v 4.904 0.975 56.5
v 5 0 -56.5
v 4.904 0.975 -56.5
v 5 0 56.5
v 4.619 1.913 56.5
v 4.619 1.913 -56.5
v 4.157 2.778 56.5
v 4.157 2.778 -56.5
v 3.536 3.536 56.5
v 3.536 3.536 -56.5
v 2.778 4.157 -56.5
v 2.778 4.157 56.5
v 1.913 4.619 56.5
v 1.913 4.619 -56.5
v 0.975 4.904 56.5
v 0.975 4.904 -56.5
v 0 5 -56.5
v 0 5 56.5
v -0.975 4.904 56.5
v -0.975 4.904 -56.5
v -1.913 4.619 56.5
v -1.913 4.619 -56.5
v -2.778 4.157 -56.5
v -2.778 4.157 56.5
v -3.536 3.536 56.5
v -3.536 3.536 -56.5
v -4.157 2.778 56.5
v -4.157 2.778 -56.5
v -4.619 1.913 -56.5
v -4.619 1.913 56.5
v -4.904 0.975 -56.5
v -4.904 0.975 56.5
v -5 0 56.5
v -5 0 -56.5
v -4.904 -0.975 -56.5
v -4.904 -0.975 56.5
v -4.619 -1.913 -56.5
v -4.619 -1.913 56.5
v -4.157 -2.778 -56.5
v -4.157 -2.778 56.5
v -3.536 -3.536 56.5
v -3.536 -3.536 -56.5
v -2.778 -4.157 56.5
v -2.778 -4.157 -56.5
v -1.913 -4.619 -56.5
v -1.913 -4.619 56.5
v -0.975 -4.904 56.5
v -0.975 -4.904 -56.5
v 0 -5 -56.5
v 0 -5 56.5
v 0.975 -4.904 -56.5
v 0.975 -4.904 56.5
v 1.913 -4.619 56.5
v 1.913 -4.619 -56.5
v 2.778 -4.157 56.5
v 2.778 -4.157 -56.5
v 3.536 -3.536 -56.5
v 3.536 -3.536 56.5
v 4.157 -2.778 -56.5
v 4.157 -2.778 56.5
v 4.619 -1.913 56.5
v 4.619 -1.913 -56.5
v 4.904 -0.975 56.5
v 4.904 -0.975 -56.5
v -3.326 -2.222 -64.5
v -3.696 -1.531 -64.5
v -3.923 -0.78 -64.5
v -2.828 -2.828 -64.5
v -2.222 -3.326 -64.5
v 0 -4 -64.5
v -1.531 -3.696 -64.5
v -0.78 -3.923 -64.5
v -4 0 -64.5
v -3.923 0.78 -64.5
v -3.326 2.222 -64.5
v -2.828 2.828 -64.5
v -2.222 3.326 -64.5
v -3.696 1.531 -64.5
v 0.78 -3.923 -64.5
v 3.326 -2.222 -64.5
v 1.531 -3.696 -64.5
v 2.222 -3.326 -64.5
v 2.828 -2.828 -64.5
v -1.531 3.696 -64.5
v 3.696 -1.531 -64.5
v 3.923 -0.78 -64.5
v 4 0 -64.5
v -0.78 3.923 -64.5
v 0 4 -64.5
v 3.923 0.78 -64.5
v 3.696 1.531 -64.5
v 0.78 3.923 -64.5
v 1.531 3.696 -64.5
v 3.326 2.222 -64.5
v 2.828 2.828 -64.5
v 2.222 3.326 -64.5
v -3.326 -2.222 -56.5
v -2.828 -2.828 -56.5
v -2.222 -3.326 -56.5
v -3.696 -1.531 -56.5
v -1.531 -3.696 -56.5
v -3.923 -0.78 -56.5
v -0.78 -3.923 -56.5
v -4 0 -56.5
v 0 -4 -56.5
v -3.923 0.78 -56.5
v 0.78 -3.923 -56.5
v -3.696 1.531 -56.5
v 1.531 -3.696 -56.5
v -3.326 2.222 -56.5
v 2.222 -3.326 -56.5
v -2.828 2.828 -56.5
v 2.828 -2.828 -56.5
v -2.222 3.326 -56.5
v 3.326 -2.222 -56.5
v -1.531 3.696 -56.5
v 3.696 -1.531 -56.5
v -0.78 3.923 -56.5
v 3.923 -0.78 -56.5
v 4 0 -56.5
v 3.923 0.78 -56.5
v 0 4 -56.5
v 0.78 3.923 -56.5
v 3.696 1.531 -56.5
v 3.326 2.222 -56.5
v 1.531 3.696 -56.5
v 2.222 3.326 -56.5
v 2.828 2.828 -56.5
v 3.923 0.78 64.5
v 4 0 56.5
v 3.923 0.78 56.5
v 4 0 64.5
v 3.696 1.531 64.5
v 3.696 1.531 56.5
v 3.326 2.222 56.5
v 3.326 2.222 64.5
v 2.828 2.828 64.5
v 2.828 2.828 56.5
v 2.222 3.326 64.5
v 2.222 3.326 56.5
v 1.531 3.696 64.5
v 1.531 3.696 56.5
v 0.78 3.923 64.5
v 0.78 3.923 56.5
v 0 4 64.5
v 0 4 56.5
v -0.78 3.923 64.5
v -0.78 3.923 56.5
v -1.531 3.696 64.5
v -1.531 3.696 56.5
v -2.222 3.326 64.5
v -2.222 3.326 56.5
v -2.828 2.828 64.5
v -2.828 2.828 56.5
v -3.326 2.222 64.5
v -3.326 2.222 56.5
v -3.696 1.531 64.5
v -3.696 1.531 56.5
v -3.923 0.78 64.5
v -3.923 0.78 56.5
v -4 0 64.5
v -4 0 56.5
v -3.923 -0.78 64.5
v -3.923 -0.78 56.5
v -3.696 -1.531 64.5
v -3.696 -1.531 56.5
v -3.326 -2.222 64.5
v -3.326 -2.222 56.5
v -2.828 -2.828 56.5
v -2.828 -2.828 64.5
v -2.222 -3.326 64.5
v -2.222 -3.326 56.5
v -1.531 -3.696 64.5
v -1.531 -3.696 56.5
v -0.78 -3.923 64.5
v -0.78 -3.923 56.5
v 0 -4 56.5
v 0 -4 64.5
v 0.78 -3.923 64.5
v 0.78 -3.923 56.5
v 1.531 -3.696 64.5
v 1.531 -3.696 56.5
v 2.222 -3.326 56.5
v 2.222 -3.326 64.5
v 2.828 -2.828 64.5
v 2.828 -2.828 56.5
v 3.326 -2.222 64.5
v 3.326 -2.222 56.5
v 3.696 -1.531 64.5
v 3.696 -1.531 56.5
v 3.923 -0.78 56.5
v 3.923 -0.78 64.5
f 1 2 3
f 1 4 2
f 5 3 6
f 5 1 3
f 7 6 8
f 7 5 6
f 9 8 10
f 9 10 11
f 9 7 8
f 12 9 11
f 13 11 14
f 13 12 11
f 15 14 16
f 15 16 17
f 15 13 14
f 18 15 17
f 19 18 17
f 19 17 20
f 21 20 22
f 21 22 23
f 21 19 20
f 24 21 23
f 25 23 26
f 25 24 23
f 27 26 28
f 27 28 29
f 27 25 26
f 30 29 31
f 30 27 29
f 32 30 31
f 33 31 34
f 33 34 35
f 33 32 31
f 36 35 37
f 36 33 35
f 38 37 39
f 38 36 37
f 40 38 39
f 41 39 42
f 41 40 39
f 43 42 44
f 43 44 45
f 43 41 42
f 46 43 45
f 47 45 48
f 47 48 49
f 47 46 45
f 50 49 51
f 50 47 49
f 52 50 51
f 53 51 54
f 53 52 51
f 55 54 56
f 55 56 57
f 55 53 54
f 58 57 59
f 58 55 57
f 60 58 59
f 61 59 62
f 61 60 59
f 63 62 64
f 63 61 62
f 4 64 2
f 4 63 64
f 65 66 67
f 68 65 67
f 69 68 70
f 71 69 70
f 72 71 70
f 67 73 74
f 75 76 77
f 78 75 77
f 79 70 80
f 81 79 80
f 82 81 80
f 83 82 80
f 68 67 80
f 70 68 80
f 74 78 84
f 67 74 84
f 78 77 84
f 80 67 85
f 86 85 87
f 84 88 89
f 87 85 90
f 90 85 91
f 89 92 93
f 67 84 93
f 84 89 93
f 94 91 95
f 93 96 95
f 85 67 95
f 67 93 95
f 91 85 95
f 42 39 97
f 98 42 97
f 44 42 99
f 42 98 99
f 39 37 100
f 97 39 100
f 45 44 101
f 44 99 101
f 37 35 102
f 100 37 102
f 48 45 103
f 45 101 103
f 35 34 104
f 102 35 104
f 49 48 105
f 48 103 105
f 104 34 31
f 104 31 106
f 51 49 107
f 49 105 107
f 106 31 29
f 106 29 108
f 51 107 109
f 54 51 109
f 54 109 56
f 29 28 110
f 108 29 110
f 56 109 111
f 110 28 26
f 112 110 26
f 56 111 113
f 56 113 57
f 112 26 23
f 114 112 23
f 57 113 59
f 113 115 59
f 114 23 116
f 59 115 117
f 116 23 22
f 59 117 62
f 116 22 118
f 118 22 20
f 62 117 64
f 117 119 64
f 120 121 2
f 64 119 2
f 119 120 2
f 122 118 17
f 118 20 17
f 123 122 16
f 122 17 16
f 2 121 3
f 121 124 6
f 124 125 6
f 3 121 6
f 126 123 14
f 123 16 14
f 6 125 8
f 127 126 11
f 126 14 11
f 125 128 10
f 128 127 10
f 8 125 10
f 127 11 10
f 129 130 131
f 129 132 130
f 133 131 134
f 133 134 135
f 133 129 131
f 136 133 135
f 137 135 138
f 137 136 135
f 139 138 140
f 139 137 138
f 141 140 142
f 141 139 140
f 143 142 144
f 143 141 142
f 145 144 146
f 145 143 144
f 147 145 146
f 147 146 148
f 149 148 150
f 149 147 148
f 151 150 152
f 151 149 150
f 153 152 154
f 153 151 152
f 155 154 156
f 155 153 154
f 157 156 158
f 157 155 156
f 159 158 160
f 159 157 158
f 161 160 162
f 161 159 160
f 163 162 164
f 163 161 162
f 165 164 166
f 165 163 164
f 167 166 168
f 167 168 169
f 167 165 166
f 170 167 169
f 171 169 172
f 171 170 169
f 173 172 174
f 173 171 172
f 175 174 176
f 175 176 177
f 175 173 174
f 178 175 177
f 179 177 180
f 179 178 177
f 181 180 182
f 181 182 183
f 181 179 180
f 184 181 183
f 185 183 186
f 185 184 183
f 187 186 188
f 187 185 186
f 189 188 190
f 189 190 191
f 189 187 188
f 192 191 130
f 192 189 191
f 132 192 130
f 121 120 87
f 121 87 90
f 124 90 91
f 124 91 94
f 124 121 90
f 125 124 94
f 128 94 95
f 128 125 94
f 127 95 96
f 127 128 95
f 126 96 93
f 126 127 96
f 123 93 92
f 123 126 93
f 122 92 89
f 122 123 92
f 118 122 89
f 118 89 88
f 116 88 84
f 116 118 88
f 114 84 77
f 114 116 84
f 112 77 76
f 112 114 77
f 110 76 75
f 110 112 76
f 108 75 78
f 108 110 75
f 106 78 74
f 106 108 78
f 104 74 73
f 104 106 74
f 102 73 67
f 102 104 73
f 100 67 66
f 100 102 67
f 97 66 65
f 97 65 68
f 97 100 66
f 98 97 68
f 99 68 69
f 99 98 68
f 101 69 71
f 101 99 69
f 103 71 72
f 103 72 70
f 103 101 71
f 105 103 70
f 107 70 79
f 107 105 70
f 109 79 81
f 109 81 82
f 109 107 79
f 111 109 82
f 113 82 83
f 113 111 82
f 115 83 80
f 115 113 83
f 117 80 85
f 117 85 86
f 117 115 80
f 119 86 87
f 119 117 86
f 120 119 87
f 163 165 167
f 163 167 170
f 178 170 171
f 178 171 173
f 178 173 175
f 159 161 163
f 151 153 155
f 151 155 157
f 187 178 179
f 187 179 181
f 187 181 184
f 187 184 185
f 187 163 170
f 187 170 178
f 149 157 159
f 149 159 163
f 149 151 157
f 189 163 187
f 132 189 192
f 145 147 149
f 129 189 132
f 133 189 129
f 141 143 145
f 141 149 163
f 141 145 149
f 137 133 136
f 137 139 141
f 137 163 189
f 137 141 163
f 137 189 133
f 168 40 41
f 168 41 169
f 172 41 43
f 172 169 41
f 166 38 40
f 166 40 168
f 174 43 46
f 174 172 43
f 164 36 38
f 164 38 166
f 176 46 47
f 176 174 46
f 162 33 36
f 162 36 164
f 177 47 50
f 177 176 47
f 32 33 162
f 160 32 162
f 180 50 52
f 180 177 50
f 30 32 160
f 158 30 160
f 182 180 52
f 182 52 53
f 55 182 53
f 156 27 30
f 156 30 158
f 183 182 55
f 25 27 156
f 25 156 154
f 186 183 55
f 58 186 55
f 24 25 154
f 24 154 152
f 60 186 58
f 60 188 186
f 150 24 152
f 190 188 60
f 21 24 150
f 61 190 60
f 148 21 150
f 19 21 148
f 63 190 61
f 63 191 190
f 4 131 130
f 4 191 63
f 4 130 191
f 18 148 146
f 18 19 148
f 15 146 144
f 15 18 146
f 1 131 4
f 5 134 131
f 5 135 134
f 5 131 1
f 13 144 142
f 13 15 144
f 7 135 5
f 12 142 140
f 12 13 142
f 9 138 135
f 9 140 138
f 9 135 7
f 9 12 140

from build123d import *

# Parameters (mm, degrees)
SKETCH1_R           = 5
BOSS_EXTRUDE1_DEPTH = 56.5
SKETCH1_3_R         = 4
BOSS_EXTRUDE2_DEPTH = 64.5


with BuildPart() as part:
    # Sketch1 → Boss-Extrude1 (new, symmetric)
    with BuildSketch(Plane.XY):
        Circle(SKETCH1_R)
    extrude(amount=BOSS_EXTRUDE1_DEPTH, both=True)

    # Sketch1<3> → Boss-Extrude2 (add, symmetric)
    with BuildSketch(Plane.XY):
        Circle(SKETCH1_3_R)
    extrude(amount=BOSS_EXTRUDE2_DEPTH, both=True)


solid = part.part
